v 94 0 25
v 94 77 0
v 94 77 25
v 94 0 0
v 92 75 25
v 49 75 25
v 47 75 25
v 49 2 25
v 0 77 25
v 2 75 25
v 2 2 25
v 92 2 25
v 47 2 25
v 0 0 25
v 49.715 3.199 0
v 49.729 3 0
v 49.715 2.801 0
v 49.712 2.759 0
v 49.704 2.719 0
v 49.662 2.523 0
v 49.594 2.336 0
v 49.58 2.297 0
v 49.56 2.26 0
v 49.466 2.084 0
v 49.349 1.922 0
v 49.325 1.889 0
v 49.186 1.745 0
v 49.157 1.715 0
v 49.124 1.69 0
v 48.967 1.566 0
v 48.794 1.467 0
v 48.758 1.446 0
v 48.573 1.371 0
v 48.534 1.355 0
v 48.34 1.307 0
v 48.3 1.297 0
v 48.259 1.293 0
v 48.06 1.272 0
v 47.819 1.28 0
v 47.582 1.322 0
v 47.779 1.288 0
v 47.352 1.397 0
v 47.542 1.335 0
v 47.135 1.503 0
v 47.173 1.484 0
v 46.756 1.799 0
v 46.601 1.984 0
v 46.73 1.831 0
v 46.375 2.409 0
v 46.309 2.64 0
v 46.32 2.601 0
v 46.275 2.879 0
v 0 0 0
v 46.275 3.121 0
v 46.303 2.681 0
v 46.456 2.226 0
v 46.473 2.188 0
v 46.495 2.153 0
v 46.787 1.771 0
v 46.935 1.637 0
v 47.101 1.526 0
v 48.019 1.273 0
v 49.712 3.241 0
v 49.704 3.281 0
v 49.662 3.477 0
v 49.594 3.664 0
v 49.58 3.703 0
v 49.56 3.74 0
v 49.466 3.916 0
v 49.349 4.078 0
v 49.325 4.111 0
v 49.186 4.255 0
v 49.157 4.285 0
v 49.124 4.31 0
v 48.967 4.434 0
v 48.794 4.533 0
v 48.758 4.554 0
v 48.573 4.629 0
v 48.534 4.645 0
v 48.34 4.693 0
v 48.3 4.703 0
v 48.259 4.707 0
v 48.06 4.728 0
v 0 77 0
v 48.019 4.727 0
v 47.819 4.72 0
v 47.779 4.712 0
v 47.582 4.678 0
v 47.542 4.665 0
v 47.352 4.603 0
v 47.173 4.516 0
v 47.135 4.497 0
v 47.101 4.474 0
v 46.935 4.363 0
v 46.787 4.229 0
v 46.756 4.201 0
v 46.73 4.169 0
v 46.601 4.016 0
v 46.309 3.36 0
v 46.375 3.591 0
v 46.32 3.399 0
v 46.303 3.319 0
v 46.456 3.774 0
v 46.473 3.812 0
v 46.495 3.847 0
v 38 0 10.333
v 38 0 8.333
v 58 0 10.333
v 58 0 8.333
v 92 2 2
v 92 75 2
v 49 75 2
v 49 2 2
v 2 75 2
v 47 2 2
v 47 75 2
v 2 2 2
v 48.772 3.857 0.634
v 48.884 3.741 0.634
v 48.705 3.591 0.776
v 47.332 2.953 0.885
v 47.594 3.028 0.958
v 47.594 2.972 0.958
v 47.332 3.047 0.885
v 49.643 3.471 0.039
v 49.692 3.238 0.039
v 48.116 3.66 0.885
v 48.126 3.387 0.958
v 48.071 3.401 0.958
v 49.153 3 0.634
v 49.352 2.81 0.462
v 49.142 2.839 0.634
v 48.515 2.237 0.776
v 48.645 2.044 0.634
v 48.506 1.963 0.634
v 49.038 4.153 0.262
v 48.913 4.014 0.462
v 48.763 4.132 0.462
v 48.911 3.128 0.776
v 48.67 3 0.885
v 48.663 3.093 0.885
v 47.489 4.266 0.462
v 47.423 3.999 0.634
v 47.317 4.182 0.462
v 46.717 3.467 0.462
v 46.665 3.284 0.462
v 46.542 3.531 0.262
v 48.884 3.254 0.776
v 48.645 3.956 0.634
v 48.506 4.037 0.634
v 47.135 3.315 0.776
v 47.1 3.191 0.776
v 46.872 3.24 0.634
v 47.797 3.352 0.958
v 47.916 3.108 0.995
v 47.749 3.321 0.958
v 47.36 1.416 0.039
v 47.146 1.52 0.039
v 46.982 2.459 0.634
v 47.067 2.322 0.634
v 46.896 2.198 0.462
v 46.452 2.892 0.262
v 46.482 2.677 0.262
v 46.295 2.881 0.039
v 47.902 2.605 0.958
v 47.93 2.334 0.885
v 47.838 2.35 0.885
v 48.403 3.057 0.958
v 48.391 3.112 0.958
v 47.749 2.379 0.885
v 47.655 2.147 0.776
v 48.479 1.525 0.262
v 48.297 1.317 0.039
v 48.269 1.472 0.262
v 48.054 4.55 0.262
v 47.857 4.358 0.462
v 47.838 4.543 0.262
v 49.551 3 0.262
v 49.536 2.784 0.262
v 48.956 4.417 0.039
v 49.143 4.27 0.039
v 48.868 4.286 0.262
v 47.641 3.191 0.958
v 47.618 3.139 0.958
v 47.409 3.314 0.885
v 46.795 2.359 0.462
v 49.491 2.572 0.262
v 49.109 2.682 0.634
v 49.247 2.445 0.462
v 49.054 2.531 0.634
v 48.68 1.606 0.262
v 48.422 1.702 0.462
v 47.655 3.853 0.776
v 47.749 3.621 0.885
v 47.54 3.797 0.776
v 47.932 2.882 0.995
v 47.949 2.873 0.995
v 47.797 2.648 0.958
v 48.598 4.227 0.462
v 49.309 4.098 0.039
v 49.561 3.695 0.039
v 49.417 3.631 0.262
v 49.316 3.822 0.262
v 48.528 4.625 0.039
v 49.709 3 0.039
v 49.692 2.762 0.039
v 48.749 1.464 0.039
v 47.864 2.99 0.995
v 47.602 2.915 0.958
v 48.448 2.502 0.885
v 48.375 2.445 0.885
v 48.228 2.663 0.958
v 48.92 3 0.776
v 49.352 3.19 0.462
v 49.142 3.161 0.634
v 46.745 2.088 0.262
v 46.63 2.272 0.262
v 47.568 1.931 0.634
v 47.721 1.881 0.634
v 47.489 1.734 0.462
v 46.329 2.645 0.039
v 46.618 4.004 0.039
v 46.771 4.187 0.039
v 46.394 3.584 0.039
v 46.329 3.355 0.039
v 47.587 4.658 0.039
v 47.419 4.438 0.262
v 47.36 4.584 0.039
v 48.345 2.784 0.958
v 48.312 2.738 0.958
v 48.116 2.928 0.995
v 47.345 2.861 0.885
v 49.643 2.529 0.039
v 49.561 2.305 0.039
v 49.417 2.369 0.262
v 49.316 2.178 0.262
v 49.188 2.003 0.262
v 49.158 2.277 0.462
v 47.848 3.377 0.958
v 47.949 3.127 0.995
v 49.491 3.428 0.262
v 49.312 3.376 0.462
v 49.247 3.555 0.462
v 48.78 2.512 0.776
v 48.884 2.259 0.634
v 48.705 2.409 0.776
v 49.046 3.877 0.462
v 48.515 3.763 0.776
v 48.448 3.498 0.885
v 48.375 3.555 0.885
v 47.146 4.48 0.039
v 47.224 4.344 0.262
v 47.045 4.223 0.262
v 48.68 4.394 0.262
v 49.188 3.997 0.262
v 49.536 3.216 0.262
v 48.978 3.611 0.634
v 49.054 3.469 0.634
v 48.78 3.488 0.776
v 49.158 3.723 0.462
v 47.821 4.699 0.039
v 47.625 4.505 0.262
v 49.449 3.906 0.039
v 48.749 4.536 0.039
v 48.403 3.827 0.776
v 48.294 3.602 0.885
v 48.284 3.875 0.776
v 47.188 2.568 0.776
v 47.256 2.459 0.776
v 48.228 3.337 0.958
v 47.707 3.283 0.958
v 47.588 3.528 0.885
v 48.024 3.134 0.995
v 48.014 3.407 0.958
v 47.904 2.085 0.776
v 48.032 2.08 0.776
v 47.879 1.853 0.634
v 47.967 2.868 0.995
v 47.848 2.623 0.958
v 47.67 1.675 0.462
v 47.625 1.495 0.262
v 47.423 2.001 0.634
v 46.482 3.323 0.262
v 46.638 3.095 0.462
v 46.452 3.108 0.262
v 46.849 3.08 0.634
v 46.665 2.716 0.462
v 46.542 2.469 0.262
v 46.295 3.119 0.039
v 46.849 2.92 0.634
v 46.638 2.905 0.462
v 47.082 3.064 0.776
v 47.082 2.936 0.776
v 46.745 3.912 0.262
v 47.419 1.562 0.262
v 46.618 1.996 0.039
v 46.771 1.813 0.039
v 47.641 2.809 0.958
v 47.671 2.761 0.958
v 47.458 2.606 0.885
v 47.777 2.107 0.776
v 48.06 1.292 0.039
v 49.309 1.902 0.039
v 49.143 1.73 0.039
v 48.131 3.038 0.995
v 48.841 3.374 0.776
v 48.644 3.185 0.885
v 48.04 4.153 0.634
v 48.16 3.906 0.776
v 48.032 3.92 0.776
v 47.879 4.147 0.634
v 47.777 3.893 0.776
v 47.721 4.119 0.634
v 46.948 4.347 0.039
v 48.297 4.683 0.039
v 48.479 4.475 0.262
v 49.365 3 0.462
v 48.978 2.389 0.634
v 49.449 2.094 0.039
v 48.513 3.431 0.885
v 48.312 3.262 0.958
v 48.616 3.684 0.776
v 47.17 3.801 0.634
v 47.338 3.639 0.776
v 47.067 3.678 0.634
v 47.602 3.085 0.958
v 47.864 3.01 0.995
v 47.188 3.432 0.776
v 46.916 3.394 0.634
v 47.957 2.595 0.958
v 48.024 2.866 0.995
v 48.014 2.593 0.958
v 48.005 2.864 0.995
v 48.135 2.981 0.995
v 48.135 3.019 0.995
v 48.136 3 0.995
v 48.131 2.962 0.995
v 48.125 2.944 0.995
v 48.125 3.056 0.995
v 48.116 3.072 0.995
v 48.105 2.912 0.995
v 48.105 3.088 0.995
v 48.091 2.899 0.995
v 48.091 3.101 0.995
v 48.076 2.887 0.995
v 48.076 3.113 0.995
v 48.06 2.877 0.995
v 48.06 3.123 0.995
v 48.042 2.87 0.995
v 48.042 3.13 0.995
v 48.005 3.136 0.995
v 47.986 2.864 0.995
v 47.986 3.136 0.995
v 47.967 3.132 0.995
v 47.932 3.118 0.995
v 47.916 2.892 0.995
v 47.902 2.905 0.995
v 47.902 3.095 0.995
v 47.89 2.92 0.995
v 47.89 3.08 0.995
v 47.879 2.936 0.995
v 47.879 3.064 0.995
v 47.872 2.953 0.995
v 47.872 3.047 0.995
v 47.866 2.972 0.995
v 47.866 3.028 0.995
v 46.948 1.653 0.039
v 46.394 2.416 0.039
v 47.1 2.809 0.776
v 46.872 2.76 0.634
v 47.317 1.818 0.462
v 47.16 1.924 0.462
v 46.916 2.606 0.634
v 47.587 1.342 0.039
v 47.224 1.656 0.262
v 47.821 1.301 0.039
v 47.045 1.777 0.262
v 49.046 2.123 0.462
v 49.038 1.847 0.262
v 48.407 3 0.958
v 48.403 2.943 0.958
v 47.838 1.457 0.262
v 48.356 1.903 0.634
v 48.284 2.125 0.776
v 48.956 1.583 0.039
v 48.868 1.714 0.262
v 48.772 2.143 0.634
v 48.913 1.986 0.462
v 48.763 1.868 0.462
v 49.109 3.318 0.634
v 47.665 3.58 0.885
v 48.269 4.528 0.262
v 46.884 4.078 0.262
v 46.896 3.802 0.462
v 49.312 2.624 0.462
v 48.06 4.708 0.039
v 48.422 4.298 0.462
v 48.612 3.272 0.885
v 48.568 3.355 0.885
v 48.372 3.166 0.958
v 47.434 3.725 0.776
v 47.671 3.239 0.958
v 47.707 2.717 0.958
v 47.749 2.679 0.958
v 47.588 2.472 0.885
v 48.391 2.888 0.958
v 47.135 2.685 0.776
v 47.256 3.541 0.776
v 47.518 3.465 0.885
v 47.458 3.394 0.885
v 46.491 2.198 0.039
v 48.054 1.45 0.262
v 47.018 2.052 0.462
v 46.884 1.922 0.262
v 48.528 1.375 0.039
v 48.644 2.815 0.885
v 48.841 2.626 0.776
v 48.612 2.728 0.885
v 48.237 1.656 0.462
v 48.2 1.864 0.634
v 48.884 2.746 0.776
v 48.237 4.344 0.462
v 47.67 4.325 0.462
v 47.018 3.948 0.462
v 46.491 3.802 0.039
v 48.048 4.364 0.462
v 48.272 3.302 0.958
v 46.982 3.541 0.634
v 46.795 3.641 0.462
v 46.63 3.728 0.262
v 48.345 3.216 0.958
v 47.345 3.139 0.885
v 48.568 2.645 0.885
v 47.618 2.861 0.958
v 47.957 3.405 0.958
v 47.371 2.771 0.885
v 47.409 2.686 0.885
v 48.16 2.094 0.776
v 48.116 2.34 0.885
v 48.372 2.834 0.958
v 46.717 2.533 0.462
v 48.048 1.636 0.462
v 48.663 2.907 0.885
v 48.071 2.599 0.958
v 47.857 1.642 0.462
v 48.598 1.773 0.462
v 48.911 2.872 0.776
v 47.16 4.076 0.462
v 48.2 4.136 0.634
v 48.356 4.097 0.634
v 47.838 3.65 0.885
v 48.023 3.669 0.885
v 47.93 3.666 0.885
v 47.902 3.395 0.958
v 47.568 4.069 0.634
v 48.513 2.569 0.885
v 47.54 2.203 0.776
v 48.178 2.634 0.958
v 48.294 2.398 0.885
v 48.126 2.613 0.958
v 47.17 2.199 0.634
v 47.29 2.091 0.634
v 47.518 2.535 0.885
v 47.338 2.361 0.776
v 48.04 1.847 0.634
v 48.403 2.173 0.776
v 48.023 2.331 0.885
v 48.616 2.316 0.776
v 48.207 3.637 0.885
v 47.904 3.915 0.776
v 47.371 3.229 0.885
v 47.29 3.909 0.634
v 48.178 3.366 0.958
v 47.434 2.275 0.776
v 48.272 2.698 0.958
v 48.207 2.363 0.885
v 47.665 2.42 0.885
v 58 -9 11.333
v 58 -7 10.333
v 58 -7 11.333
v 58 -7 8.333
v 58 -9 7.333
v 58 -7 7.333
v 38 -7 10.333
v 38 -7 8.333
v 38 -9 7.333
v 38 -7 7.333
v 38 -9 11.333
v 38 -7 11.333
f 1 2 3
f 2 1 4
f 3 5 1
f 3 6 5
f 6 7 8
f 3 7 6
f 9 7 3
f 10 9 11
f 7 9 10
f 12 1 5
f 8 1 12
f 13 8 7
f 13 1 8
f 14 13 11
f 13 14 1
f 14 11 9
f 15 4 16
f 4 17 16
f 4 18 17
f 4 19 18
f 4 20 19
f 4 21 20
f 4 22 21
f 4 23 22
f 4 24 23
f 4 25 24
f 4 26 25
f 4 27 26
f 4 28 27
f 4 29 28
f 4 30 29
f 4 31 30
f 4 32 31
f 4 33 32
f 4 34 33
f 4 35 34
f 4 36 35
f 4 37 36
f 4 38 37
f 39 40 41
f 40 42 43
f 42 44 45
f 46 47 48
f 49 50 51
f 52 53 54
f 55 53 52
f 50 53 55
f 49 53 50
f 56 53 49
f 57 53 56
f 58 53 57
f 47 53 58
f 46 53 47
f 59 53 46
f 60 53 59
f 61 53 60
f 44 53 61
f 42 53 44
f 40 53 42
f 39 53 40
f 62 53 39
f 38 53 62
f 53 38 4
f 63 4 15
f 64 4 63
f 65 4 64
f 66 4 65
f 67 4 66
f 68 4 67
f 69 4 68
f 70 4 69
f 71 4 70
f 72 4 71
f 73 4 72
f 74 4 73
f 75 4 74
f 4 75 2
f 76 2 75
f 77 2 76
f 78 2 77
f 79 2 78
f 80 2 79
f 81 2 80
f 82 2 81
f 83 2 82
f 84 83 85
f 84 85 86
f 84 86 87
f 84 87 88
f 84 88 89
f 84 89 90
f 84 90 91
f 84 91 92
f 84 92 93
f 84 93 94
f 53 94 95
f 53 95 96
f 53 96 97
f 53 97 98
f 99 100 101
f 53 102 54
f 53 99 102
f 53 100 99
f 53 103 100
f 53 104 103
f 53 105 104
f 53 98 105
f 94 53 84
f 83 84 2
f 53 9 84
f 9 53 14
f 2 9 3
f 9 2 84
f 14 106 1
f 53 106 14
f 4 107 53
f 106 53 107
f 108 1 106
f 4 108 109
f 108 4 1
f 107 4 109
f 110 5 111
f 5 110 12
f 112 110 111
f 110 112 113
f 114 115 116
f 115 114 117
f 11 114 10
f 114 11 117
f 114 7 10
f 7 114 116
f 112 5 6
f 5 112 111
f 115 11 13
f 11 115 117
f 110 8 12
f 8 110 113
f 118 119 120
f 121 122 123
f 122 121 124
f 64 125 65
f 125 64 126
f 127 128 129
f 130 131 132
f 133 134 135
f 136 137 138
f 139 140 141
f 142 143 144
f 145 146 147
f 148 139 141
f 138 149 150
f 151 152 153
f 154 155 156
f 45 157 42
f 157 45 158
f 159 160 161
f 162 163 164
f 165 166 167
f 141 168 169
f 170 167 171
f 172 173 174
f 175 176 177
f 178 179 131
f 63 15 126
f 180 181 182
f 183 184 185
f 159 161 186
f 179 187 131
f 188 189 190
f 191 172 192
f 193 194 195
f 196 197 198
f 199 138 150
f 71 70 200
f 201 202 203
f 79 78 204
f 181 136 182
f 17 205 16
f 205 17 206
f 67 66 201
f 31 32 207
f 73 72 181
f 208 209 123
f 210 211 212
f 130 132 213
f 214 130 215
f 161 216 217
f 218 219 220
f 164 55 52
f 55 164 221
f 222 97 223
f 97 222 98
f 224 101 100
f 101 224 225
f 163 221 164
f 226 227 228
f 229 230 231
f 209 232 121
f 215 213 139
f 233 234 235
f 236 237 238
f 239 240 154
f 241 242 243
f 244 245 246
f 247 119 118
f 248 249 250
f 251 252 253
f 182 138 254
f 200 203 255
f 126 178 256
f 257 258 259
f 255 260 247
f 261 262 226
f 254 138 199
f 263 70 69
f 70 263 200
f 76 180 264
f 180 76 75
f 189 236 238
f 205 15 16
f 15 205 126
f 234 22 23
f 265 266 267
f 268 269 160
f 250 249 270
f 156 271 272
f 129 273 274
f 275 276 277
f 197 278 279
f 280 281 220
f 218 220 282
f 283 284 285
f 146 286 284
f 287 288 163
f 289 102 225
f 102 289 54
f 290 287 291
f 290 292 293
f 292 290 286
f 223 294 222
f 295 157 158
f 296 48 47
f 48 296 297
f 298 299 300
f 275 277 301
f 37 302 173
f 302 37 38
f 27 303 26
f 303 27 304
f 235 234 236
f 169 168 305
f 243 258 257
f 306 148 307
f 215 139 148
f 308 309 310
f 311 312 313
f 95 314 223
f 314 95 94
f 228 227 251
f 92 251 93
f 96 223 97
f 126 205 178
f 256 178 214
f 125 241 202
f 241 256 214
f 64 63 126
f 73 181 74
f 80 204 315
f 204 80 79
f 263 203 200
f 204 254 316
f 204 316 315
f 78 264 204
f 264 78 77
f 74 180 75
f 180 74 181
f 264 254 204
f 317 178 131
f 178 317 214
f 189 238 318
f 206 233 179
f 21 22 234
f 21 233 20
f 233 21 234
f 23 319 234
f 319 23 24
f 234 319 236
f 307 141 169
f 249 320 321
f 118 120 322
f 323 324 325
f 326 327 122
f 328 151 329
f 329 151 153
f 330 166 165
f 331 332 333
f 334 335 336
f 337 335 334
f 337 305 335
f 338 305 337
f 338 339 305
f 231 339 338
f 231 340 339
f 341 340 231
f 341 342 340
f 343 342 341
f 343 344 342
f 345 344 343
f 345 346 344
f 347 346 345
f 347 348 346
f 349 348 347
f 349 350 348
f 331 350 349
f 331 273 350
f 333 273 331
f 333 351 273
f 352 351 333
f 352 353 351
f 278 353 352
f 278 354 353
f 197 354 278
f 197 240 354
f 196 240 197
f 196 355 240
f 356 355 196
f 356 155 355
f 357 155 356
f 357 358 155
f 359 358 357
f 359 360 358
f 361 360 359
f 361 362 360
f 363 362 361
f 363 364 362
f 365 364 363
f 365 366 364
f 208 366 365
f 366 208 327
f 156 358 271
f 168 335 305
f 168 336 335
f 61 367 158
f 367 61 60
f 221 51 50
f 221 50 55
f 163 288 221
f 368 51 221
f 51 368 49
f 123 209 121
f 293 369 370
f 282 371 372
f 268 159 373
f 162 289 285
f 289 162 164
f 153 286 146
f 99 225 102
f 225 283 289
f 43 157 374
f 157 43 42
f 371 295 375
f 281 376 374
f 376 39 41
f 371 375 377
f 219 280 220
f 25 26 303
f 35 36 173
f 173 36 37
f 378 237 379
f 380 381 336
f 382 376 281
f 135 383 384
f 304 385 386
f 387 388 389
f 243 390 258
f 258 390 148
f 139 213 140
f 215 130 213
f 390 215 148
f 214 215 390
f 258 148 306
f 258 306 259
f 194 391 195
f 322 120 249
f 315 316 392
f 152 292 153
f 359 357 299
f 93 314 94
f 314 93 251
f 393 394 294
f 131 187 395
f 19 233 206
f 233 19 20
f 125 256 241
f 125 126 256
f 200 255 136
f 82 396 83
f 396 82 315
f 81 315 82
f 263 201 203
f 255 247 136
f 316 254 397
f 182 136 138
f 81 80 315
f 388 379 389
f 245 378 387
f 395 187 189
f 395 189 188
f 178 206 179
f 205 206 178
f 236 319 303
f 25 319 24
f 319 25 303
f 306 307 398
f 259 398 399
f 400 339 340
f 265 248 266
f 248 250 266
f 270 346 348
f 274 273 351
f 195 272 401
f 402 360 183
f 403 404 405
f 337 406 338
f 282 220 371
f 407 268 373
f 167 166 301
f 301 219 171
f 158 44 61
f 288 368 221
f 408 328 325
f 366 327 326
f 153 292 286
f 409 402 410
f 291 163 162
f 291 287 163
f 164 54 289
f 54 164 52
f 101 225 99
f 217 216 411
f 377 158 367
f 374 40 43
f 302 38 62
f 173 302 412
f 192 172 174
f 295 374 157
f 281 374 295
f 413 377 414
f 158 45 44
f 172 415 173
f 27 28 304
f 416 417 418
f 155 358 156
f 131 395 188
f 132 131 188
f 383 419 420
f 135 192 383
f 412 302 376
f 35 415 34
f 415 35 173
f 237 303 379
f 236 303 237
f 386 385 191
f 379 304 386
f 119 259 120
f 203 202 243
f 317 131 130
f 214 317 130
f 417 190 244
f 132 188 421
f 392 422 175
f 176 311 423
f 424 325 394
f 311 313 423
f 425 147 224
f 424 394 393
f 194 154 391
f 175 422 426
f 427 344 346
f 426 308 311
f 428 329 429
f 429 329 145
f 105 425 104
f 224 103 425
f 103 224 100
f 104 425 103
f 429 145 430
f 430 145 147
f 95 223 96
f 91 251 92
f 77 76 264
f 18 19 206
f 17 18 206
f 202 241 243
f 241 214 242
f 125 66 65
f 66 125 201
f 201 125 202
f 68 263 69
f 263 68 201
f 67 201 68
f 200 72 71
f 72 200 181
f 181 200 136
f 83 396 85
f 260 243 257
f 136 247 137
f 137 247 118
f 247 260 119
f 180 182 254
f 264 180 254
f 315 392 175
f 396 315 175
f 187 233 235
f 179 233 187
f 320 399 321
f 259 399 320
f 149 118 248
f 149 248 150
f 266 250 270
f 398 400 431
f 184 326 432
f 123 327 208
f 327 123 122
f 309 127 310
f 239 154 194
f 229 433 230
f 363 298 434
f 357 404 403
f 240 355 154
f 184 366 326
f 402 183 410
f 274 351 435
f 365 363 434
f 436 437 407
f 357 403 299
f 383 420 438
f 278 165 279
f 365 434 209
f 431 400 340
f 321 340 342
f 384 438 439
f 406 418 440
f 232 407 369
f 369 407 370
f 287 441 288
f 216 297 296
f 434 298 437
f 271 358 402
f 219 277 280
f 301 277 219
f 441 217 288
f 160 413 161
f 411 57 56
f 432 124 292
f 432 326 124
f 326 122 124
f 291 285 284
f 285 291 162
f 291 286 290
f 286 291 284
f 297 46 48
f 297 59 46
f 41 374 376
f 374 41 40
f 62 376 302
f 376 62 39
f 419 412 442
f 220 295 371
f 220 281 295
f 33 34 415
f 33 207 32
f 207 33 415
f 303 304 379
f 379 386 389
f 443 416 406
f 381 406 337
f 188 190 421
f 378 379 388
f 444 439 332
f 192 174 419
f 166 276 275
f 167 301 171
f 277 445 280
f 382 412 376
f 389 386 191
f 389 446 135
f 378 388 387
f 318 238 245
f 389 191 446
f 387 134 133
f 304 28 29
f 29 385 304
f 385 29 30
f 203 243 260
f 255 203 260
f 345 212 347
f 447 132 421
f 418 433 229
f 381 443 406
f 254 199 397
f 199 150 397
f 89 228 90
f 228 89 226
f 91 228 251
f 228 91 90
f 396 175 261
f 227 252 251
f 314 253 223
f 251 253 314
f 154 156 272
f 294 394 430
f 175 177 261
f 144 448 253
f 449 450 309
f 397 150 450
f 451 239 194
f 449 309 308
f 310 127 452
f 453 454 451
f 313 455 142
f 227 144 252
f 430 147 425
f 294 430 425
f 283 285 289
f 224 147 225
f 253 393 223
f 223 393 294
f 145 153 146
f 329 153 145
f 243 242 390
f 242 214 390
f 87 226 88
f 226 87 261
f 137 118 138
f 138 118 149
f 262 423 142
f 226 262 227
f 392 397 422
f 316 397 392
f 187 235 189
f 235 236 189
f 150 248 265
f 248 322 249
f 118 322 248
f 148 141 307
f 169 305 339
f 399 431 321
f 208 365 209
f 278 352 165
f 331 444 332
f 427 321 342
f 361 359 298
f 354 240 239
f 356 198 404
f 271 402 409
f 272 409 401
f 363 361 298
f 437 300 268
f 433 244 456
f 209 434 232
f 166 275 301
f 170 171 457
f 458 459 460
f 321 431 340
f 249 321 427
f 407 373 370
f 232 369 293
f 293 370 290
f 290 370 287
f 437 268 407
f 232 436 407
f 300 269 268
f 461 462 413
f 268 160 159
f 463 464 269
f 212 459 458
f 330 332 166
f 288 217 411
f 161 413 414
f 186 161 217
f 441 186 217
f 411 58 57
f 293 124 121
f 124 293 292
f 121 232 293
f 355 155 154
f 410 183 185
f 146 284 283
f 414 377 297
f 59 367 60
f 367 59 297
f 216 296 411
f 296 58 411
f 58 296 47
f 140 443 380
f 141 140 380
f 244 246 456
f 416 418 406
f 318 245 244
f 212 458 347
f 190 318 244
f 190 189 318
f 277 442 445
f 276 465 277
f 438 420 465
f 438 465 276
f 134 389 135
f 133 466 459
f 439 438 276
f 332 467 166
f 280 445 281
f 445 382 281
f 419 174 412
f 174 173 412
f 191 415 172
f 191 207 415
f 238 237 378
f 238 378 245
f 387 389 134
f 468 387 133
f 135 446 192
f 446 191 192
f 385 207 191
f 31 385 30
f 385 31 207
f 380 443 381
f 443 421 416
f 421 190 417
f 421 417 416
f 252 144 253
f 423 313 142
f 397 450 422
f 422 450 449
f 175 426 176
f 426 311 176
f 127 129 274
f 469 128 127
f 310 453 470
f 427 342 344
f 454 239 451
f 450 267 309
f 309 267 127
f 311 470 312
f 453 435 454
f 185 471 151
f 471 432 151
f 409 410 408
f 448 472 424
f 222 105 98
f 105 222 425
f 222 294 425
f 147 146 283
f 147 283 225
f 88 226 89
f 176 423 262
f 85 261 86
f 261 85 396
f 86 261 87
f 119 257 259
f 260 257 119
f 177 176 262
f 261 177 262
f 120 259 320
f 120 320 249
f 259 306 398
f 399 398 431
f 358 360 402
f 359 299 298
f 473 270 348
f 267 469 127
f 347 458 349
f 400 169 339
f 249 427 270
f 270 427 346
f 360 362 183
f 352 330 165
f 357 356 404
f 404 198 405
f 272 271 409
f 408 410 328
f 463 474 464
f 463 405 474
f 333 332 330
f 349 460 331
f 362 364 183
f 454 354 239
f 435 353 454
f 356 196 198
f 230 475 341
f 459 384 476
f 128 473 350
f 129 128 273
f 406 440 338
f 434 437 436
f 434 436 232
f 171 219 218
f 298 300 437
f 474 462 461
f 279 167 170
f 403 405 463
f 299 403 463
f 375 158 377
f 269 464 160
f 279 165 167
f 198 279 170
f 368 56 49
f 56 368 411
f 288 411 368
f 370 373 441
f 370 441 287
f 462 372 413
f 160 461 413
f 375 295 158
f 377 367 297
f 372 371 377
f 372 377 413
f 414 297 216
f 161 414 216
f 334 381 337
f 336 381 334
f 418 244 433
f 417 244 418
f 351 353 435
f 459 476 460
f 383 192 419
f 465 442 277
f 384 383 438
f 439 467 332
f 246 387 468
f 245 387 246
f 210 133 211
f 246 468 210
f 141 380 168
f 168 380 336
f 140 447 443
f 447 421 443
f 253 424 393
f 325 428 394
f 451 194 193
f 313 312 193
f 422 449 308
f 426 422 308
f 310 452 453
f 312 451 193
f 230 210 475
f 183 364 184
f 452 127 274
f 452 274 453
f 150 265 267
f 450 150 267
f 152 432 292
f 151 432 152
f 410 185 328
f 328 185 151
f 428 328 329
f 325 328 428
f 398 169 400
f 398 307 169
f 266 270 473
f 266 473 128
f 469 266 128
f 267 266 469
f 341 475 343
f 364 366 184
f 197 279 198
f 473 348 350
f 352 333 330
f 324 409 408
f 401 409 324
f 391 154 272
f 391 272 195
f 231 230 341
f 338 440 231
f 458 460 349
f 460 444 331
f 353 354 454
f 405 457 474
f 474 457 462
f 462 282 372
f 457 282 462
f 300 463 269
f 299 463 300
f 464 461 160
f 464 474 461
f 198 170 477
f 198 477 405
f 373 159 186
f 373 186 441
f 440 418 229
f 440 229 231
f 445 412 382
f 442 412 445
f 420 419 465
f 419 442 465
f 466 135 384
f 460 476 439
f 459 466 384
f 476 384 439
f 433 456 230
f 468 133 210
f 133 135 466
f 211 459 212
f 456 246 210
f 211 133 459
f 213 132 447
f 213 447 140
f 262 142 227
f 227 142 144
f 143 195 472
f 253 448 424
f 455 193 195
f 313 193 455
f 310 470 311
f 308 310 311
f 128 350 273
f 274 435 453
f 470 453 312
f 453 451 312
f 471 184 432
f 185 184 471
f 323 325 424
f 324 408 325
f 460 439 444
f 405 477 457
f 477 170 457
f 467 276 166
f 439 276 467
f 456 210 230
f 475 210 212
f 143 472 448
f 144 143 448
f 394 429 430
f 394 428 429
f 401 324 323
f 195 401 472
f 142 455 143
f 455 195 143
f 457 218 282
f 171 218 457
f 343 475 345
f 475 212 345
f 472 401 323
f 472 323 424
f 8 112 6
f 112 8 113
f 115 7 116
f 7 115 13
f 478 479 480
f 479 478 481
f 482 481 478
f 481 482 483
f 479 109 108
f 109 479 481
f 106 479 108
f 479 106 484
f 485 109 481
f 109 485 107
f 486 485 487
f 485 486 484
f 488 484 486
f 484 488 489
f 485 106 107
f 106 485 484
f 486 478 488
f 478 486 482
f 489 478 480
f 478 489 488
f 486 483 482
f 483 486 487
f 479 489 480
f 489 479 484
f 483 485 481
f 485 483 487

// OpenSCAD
$fn = 45;

DRAWER_HEIGHT = 25;
CABINET_WIDTH = 100; // adjustable from ~30-200
CABINET_DEPTH = 80;  // adjustable from ~50-200

// drawer 2, single divider
difference() {
    translate([0,0,0]) cube([CABINET_WIDTH - 6, CABINET_DEPTH - 3, DRAWER_HEIGHT]);
    translate([2,2,2]) cube([CABINET_WIDTH - 10, CABINET_DEPTH - 7, DRAWER_HEIGHT]);
    translate([(CABINET_WIDTH / 2) - 2, 3, -1]) sphere(2);
}

// divider
difference() {
    translate([(CABINET_WIDTH / 2) - 3,2,0]) cube([2, CABINET_DEPTH - 7, DRAWER_HEIGHT]);
    translate([(CABINET_WIDTH / 2) - 2, 3, 0]) sphere(2);
}
// pull handle
translate([(CABINET_WIDTH / 2) - 12,-9,(DRAWER_HEIGHT / 3)]) cube([20, 10, 2]);
translate([(CABINET_WIDTH / 2) - 12,-9,(DRAWER_HEIGHT / 3) -1]) cube([20, 2, 4]);
